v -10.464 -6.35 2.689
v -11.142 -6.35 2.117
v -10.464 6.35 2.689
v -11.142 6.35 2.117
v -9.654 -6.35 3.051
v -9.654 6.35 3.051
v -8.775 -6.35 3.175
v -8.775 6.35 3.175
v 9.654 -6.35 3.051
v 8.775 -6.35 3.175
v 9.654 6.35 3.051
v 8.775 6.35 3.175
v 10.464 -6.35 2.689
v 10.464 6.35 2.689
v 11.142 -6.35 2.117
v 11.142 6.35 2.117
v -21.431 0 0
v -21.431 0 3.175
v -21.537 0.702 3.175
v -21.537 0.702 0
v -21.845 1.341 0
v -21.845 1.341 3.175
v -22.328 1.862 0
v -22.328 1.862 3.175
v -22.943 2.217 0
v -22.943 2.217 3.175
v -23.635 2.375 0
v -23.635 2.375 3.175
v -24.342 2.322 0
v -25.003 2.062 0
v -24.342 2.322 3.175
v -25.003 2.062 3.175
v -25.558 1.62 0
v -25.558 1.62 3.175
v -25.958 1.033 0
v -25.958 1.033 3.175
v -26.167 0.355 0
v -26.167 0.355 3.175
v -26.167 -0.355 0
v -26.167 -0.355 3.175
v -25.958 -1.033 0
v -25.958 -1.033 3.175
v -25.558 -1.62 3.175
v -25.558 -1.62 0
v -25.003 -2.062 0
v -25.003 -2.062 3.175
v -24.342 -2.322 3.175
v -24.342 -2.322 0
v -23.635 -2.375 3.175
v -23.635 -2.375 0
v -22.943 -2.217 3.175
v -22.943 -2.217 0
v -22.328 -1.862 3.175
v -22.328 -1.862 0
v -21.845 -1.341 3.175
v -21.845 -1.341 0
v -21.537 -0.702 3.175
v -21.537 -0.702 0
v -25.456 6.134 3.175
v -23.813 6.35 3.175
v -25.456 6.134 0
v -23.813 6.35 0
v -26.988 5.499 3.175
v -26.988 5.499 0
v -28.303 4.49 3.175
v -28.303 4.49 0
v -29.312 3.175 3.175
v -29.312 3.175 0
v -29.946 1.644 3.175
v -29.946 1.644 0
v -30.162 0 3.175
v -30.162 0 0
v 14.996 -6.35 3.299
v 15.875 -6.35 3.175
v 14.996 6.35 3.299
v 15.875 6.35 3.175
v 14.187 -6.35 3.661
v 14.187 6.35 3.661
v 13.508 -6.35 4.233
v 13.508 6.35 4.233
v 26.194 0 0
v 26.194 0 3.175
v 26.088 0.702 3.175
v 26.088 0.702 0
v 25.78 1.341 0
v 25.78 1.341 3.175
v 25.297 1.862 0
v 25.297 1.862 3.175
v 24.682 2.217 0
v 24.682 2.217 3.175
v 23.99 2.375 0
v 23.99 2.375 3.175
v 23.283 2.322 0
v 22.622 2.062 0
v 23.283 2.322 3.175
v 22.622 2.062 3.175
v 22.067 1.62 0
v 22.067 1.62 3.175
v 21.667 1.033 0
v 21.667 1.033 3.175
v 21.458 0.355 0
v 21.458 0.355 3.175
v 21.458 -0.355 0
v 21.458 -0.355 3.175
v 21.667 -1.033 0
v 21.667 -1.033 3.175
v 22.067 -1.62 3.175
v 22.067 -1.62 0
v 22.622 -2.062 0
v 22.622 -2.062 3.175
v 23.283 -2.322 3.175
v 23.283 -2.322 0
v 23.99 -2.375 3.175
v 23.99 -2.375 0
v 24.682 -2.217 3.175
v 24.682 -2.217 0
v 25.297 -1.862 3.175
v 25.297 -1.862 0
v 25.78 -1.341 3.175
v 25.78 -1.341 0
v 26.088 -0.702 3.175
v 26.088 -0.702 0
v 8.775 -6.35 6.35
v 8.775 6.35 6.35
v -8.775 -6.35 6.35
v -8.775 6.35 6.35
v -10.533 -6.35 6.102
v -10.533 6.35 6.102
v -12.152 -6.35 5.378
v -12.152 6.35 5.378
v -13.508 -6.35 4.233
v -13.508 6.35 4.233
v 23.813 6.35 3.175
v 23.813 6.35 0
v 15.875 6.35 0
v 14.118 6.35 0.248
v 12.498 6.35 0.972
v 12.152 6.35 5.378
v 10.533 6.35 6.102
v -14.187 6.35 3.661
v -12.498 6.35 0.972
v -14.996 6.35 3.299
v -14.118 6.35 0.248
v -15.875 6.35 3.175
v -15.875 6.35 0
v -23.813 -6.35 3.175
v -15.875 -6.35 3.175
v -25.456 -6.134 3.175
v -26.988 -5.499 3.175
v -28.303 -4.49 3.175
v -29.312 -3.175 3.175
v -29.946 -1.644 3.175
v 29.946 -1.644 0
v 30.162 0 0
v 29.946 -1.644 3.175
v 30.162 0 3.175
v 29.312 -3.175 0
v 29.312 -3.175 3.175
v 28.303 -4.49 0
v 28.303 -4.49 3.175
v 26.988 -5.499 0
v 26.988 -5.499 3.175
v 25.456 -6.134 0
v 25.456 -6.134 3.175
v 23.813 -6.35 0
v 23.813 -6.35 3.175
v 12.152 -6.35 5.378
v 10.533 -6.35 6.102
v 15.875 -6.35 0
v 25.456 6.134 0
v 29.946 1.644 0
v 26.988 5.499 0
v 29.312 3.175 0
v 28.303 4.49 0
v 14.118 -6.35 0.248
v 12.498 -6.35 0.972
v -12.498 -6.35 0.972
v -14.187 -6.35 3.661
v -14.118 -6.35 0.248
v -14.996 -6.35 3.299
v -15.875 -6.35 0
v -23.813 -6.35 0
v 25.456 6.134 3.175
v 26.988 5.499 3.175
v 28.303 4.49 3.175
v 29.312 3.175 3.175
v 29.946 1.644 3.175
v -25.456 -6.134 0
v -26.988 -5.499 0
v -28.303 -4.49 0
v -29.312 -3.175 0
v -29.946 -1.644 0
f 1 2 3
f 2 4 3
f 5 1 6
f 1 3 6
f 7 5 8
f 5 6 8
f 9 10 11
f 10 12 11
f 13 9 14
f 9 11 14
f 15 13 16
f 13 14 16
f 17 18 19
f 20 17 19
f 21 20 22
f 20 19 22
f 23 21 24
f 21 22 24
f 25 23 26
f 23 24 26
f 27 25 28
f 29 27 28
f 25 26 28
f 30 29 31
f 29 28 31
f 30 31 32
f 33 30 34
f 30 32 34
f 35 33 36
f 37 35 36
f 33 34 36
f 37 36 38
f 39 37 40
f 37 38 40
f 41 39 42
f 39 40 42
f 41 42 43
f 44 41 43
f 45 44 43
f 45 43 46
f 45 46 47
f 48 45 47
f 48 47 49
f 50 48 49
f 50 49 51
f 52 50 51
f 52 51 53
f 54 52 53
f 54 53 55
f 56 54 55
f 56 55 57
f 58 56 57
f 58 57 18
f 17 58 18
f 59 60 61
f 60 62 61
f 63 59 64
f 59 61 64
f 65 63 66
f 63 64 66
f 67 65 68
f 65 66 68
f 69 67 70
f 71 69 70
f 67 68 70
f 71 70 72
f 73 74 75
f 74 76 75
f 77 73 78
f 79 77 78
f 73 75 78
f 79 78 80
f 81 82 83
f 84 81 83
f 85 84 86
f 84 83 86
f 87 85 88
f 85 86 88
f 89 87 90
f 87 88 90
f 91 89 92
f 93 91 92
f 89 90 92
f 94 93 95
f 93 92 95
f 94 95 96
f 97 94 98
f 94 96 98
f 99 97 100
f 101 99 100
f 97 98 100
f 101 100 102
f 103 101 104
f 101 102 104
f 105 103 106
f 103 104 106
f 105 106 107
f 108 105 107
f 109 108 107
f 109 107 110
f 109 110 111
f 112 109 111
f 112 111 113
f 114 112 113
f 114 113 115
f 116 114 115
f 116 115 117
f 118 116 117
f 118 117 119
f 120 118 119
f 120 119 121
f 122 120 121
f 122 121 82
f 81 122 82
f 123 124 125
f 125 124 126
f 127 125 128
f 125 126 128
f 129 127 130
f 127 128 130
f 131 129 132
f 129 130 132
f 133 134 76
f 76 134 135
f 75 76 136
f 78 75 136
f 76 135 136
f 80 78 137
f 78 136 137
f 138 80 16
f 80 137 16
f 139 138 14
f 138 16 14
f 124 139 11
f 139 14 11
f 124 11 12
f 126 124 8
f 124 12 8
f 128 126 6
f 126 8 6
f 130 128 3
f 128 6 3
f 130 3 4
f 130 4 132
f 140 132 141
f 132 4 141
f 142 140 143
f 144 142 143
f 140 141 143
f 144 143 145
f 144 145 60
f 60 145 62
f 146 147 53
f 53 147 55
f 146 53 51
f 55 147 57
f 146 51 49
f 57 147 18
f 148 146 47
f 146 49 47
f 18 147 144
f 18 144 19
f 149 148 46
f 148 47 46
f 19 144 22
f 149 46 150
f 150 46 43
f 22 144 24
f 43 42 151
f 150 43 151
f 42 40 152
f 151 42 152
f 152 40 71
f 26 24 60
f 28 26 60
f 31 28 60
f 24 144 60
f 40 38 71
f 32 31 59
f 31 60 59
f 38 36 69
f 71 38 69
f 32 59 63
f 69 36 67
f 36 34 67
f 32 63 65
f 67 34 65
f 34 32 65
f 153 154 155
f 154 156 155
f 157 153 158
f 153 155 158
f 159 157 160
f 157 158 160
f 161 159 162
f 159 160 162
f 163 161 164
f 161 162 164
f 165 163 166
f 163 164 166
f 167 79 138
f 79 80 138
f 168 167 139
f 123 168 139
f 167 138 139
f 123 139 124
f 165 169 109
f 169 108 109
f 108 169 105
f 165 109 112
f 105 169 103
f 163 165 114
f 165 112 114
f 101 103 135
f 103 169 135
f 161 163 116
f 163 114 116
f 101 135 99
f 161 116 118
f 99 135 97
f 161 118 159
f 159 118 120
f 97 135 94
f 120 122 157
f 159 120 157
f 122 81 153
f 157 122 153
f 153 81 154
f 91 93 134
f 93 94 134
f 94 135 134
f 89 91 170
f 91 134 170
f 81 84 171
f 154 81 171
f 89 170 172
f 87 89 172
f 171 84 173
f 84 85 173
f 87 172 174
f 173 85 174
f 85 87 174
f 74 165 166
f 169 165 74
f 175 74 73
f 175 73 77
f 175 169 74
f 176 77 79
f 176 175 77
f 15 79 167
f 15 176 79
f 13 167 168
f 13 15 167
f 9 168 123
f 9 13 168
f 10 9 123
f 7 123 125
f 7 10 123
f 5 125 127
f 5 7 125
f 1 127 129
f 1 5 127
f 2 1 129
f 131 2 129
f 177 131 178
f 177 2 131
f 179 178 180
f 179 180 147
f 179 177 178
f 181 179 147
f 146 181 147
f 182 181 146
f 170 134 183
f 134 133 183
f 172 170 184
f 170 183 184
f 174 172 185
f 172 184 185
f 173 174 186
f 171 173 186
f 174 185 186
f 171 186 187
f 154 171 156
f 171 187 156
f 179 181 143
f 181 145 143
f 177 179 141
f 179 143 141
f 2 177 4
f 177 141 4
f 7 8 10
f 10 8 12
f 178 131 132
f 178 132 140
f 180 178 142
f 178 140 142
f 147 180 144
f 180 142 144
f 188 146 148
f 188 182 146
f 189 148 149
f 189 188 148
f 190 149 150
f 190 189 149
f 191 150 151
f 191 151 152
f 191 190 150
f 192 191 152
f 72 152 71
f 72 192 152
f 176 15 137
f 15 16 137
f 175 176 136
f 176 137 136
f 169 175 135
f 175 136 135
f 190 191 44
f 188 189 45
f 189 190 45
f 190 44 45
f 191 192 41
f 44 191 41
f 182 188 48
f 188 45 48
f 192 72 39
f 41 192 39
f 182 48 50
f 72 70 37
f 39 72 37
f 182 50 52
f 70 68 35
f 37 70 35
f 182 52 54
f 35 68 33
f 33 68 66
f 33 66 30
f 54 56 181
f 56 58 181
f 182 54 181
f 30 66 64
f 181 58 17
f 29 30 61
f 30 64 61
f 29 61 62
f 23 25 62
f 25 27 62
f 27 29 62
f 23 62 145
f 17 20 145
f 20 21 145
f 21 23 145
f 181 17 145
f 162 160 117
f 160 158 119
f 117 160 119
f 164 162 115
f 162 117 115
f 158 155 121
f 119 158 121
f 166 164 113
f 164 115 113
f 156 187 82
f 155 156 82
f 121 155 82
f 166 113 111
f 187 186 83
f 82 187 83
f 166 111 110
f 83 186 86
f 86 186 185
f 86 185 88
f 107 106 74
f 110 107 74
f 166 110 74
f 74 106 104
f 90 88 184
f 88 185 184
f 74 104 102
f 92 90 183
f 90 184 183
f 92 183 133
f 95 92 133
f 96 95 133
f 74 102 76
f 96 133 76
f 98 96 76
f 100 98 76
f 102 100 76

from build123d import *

# Parameters (mm, degrees)
BASE_EXTRUDE_DEPTH = 6.35
FILLET1_R          = 6.35
SKETCH2_R          = 2.38125
CUT_EXTRUDE1_DEPTH = 31.986763807


with BuildPart() as part:
    # Sketch1 → Base-Extrude (new, symmetric)
    with BuildSketch(Plane(origin=(0, 0, 0), x_dir=(1, 0, 0), z_dir=(0, 1, 0))):
        with BuildLine():
            Line((-30.1625, 0), (-15.875, 0))
            ThreePointArc((-15.875, 0), (-13.282623356, -0.5532696), (-11.141989448, -2.116666667))
            ThreePointArc((-11.141989448, -2.116666667), (-10.071672494, -2.8983652), (-8.775484171, -3.175))
            Line((-8.775484171, -3.175), (8.775484171, -3.175))
            ThreePointArc((8.775484171, -3.175), (10.071672494, -2.8983652), (11.141989448, -2.116666667))
            ThreePointArc((11.141989448, -2.116666667), (13.282623356, -0.5532696), (15.875, 0))
            Line((15.875, 0), (30.1625, 0))
            Line((30.1625, 0), (30.1625, -3.175))
            Line((30.1625, -3.175), (15.875, -3.175))
            ThreePointArc((15.875, -3.175), (14.578811678, -3.4516348), (13.508494724, -4.233333333))
            ThreePointArc((13.508494724, -4.233333333), (11.367860816, -5.7967304), (8.775484171, -6.35))
            Line((8.775484171, -6.35), (-8.775484171, -6.35))
            ThreePointArc((-8.775484171, -6.35), (-11.367860816, -5.7967304), (-13.508494724, -4.233333333))
            ThreePointArc((-13.508494724, -4.233333333), (-14.578811678, -3.4516348), (-15.875, -3.175))
            Line((-15.875, -3.175), (-30.1625, -3.175))
            Line((-30.1625, -3.175), (-30.1625, 0))
        make_face()
    extrude(amount=BASE_EXTRUDE_DEPTH, both=True)

    # Fillet1
    fillet1_edges = [part.edges().sort_by_distance(p)[0] for p in [
        (30.1625, -6.35, 1.5875),
        (-30.1625, -6.35, 1.5875),
        (30.1625, 6.35, 1.5875),
        (-30.1625, 6.35, 1.5875),
    ]]
    fillet(fillet1_edges, radius=FILLET1_R - 0.0001)  # a hair under: the kernel refuses the full size

    # Sketch2 → Cut-Extrude1 (cut, through all)
    with BuildSketch(Plane.XY.offset(3.175)):
        with Locations((23.8125, 0)):
            Circle(SKETCH2_R)
        with Locations((-23.8125, 0)):
            Circle(SKETCH2_R)
    extrude(amount=-CUT_EXTRUDE1_DEPTH, mode=Mode.SUBTRACT)


solid = part.part
